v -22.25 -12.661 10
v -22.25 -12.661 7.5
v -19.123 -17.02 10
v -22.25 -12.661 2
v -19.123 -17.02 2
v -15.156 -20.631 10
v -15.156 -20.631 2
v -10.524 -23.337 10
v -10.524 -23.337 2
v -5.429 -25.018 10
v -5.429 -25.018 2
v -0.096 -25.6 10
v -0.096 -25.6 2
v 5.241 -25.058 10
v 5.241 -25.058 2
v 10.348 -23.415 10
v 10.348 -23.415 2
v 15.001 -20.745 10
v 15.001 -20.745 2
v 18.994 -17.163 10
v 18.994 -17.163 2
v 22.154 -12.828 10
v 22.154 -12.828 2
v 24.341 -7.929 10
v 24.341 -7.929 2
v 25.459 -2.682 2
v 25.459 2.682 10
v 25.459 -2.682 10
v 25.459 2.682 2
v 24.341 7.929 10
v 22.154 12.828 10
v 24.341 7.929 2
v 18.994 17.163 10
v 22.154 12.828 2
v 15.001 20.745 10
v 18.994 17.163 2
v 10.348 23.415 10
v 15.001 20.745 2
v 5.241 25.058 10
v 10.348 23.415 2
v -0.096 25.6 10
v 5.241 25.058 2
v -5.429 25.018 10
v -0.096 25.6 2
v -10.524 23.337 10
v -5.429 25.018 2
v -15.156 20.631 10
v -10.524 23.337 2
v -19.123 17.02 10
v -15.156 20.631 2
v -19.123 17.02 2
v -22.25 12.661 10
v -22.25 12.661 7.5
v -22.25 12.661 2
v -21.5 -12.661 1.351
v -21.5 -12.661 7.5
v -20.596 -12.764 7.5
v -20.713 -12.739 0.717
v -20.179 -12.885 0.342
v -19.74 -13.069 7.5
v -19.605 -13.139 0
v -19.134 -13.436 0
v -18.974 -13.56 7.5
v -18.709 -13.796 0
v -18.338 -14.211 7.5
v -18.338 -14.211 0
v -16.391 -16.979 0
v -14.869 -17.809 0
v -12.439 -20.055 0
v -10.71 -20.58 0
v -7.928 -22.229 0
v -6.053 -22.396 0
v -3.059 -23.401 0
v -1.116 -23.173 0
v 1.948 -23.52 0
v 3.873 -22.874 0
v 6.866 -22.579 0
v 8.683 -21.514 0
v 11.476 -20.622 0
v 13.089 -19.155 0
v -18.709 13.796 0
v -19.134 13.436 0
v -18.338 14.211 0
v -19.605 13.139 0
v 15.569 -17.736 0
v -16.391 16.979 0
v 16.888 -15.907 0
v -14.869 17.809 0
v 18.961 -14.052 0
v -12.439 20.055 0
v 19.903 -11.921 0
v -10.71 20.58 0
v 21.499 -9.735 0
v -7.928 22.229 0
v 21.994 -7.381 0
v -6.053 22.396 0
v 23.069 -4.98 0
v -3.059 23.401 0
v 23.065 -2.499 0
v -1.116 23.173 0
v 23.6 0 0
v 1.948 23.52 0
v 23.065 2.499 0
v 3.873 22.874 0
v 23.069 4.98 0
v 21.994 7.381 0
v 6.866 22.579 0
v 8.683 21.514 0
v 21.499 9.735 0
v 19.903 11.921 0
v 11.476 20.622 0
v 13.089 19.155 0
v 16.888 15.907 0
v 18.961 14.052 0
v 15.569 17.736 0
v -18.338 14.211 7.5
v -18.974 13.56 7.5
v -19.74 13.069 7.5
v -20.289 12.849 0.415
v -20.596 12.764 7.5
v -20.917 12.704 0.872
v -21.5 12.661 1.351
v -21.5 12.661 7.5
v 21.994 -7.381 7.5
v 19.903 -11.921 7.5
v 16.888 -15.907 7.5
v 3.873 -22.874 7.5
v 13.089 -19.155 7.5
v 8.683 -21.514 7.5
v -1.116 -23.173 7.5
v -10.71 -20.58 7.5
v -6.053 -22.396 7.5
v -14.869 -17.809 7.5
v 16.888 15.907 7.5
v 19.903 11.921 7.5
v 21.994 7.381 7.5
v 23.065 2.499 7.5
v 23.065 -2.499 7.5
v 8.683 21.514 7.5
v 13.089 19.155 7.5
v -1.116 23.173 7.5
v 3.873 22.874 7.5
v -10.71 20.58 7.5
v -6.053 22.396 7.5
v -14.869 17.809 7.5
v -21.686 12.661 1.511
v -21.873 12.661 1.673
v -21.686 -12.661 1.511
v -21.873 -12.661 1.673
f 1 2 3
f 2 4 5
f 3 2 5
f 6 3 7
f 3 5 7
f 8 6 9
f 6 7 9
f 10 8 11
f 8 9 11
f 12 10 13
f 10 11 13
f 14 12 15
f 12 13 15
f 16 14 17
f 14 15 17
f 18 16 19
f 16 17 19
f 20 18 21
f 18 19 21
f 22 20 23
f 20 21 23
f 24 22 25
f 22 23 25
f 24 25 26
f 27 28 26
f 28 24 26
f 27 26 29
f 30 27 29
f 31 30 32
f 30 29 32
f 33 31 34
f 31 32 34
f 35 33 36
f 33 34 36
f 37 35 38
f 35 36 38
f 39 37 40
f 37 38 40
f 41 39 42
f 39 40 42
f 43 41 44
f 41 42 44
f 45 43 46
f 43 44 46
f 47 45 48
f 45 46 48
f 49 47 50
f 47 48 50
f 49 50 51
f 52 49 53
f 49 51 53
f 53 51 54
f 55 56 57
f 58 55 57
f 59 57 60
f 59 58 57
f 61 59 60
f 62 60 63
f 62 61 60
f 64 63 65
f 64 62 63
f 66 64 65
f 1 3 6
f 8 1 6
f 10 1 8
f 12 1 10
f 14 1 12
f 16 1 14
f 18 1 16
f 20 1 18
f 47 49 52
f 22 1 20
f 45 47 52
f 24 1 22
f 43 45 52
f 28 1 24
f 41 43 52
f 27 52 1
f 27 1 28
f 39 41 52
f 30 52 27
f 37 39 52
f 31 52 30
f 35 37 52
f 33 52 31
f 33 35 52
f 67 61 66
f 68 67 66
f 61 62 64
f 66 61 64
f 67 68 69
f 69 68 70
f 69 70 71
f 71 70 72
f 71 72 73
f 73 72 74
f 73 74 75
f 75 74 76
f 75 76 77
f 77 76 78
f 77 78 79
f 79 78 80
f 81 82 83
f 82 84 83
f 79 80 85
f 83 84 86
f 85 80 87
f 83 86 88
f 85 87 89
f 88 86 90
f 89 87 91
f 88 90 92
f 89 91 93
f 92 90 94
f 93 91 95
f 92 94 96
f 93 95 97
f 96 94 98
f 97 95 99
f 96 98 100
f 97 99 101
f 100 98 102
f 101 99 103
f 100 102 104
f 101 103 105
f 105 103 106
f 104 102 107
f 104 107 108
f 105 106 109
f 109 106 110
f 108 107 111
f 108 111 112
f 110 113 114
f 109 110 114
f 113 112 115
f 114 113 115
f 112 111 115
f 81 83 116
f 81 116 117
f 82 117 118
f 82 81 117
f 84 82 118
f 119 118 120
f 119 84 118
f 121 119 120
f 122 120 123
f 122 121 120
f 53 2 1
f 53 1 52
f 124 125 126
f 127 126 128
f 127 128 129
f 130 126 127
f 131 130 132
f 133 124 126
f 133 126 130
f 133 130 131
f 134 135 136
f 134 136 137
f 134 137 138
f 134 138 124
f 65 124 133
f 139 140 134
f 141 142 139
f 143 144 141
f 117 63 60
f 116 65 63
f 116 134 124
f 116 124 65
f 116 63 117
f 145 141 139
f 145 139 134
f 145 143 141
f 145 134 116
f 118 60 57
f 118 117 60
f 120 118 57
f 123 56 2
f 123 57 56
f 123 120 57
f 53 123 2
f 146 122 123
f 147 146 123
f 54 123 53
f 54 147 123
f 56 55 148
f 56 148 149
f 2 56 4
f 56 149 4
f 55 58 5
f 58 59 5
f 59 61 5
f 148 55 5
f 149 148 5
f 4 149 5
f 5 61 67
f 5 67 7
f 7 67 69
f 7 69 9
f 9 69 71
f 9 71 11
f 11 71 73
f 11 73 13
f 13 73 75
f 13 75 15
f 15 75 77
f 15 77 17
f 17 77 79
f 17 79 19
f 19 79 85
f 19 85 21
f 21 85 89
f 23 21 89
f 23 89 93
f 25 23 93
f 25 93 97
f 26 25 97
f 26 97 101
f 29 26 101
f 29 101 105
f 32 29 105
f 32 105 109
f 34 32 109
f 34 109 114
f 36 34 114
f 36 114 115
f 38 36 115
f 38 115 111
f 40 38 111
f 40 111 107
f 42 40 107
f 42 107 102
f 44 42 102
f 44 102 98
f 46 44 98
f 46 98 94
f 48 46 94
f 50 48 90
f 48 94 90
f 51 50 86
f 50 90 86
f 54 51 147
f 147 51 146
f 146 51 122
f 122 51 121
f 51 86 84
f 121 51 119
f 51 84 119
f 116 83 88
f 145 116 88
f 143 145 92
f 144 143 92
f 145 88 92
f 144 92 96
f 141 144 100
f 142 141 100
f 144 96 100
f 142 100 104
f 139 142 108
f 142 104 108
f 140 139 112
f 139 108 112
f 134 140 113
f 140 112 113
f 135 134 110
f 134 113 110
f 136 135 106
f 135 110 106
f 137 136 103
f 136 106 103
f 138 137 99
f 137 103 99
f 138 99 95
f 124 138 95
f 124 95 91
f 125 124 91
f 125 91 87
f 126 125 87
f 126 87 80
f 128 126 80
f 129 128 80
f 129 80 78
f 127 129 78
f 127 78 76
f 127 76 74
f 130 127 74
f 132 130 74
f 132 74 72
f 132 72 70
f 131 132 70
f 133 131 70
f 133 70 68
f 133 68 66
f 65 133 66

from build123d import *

# Parameters (mm, degrees)
SKETCH_1_R          = 25.6
EXTRUDE_1_DEPTH     = 10
CHAMFER_1_SIZE      = 2
CUT_EXTRUDE_START   = -2.5
CUT_EXTRUDE_1_DEPTH = 2.5
SKETCH_3_R          = 23.2
CUT_EXTRUDE_2_DEPTH = 7.5
CUT_EXTRUDE_3_REACH = 39.56
SKETCH_5_W          = 9.365653714
SKETCH_5_H          = 25.321729798
FILLET_2_R          = 4


with BuildPart() as part:
    # Эскиз1 → Бобышка-Вытянуть1 (new body)
    with BuildSketch(Plane.XY):
        Circle(SKETCH_1_R)
    extrude(amount=EXTRUDE_1_DEPTH)

    # Фаска1
    chamfer_1_edges = [part.edges().sort_by_distance(p)[0] for p in [
        (-25.6, 0, 0),
    ]]
    chamfer(chamfer_1_edges, length=CHAMFER_1_SIZE)

    # Эскиз2 → Вырез-Вытянуть1 (cut)
    with BuildSketch(Plane.XY.offset(10).offset(CUT_EXTRUDE_START)):
        with BuildLine():
            Line((-22.25, -12.660864899), (-22.25, 12.660864899))
            ThreePointArc((-22.25, 12.660864899), (-25.6, 0), (-22.25, -12.660864899))
        make_face()
    extrude(amount=CUT_EXTRUDE_1_DEPTH, mode=Mode.SUBTRACT)

    # Эскиз3 → Вырез-Вытянуть2 (cut)
    with BuildSketch(Plane(origin=(0, 0, 0), x_dir=(-1, 0, 0), z_dir=(0, 0, -1))):
        Circle(SKETCH_3_R)
    extrude(amount=-CUT_EXTRUDE_2_DEPTH, mode=Mode.SUBTRACT)

    # Вырез-Вытянуть3: up to this face of the body (flat: up to its plane)
    cut_extrude_3_end = Plane(part.part.faces().sort_by_distance((0.112414177, 0, 7.5))[0])
    # Эскиз5 → Вырез-Вытянуть3 (cut, up to the picked face)
    with BuildSketch(Plane(origin=(0, 0, 0), x_dir=(-1, 0, 0), z_dir=(0, 0, -1)), mode=Mode.PRIVATE) as cut_extrude_3_sk1:
        with Locations((22.25, 0)):
            Rectangle(SKETCH_5_W, SKETCH_5_H)
    cut_extrude_3_tool1 = split(extrude(cut_extrude_3_sk1.sketch, amount=-CUT_EXTRUDE_3_REACH, mode=Mode.PRIVATE), bisect_by=cut_extrude_3_end, keep=Keep.BOTH, mode=Mode.PRIVATE)
    add(cut_extrude_3_tool1.solids().sort_by(Axis((-22.25, 0, 0), (0, 0, 1)))[0], mode=Mode.SUBTRACT)

    # Скругление2
    fillet_2_edges = [part.edges().sort_by_distance(p)[0] for p in [
        (-19.440743299, 12.660864899, 3.75),
        (-19.440743299, -12.660864899, 3.75),
    ]]
    fillet(fillet_2_edges, radius=FILLET_2_R)


solid = part.part
